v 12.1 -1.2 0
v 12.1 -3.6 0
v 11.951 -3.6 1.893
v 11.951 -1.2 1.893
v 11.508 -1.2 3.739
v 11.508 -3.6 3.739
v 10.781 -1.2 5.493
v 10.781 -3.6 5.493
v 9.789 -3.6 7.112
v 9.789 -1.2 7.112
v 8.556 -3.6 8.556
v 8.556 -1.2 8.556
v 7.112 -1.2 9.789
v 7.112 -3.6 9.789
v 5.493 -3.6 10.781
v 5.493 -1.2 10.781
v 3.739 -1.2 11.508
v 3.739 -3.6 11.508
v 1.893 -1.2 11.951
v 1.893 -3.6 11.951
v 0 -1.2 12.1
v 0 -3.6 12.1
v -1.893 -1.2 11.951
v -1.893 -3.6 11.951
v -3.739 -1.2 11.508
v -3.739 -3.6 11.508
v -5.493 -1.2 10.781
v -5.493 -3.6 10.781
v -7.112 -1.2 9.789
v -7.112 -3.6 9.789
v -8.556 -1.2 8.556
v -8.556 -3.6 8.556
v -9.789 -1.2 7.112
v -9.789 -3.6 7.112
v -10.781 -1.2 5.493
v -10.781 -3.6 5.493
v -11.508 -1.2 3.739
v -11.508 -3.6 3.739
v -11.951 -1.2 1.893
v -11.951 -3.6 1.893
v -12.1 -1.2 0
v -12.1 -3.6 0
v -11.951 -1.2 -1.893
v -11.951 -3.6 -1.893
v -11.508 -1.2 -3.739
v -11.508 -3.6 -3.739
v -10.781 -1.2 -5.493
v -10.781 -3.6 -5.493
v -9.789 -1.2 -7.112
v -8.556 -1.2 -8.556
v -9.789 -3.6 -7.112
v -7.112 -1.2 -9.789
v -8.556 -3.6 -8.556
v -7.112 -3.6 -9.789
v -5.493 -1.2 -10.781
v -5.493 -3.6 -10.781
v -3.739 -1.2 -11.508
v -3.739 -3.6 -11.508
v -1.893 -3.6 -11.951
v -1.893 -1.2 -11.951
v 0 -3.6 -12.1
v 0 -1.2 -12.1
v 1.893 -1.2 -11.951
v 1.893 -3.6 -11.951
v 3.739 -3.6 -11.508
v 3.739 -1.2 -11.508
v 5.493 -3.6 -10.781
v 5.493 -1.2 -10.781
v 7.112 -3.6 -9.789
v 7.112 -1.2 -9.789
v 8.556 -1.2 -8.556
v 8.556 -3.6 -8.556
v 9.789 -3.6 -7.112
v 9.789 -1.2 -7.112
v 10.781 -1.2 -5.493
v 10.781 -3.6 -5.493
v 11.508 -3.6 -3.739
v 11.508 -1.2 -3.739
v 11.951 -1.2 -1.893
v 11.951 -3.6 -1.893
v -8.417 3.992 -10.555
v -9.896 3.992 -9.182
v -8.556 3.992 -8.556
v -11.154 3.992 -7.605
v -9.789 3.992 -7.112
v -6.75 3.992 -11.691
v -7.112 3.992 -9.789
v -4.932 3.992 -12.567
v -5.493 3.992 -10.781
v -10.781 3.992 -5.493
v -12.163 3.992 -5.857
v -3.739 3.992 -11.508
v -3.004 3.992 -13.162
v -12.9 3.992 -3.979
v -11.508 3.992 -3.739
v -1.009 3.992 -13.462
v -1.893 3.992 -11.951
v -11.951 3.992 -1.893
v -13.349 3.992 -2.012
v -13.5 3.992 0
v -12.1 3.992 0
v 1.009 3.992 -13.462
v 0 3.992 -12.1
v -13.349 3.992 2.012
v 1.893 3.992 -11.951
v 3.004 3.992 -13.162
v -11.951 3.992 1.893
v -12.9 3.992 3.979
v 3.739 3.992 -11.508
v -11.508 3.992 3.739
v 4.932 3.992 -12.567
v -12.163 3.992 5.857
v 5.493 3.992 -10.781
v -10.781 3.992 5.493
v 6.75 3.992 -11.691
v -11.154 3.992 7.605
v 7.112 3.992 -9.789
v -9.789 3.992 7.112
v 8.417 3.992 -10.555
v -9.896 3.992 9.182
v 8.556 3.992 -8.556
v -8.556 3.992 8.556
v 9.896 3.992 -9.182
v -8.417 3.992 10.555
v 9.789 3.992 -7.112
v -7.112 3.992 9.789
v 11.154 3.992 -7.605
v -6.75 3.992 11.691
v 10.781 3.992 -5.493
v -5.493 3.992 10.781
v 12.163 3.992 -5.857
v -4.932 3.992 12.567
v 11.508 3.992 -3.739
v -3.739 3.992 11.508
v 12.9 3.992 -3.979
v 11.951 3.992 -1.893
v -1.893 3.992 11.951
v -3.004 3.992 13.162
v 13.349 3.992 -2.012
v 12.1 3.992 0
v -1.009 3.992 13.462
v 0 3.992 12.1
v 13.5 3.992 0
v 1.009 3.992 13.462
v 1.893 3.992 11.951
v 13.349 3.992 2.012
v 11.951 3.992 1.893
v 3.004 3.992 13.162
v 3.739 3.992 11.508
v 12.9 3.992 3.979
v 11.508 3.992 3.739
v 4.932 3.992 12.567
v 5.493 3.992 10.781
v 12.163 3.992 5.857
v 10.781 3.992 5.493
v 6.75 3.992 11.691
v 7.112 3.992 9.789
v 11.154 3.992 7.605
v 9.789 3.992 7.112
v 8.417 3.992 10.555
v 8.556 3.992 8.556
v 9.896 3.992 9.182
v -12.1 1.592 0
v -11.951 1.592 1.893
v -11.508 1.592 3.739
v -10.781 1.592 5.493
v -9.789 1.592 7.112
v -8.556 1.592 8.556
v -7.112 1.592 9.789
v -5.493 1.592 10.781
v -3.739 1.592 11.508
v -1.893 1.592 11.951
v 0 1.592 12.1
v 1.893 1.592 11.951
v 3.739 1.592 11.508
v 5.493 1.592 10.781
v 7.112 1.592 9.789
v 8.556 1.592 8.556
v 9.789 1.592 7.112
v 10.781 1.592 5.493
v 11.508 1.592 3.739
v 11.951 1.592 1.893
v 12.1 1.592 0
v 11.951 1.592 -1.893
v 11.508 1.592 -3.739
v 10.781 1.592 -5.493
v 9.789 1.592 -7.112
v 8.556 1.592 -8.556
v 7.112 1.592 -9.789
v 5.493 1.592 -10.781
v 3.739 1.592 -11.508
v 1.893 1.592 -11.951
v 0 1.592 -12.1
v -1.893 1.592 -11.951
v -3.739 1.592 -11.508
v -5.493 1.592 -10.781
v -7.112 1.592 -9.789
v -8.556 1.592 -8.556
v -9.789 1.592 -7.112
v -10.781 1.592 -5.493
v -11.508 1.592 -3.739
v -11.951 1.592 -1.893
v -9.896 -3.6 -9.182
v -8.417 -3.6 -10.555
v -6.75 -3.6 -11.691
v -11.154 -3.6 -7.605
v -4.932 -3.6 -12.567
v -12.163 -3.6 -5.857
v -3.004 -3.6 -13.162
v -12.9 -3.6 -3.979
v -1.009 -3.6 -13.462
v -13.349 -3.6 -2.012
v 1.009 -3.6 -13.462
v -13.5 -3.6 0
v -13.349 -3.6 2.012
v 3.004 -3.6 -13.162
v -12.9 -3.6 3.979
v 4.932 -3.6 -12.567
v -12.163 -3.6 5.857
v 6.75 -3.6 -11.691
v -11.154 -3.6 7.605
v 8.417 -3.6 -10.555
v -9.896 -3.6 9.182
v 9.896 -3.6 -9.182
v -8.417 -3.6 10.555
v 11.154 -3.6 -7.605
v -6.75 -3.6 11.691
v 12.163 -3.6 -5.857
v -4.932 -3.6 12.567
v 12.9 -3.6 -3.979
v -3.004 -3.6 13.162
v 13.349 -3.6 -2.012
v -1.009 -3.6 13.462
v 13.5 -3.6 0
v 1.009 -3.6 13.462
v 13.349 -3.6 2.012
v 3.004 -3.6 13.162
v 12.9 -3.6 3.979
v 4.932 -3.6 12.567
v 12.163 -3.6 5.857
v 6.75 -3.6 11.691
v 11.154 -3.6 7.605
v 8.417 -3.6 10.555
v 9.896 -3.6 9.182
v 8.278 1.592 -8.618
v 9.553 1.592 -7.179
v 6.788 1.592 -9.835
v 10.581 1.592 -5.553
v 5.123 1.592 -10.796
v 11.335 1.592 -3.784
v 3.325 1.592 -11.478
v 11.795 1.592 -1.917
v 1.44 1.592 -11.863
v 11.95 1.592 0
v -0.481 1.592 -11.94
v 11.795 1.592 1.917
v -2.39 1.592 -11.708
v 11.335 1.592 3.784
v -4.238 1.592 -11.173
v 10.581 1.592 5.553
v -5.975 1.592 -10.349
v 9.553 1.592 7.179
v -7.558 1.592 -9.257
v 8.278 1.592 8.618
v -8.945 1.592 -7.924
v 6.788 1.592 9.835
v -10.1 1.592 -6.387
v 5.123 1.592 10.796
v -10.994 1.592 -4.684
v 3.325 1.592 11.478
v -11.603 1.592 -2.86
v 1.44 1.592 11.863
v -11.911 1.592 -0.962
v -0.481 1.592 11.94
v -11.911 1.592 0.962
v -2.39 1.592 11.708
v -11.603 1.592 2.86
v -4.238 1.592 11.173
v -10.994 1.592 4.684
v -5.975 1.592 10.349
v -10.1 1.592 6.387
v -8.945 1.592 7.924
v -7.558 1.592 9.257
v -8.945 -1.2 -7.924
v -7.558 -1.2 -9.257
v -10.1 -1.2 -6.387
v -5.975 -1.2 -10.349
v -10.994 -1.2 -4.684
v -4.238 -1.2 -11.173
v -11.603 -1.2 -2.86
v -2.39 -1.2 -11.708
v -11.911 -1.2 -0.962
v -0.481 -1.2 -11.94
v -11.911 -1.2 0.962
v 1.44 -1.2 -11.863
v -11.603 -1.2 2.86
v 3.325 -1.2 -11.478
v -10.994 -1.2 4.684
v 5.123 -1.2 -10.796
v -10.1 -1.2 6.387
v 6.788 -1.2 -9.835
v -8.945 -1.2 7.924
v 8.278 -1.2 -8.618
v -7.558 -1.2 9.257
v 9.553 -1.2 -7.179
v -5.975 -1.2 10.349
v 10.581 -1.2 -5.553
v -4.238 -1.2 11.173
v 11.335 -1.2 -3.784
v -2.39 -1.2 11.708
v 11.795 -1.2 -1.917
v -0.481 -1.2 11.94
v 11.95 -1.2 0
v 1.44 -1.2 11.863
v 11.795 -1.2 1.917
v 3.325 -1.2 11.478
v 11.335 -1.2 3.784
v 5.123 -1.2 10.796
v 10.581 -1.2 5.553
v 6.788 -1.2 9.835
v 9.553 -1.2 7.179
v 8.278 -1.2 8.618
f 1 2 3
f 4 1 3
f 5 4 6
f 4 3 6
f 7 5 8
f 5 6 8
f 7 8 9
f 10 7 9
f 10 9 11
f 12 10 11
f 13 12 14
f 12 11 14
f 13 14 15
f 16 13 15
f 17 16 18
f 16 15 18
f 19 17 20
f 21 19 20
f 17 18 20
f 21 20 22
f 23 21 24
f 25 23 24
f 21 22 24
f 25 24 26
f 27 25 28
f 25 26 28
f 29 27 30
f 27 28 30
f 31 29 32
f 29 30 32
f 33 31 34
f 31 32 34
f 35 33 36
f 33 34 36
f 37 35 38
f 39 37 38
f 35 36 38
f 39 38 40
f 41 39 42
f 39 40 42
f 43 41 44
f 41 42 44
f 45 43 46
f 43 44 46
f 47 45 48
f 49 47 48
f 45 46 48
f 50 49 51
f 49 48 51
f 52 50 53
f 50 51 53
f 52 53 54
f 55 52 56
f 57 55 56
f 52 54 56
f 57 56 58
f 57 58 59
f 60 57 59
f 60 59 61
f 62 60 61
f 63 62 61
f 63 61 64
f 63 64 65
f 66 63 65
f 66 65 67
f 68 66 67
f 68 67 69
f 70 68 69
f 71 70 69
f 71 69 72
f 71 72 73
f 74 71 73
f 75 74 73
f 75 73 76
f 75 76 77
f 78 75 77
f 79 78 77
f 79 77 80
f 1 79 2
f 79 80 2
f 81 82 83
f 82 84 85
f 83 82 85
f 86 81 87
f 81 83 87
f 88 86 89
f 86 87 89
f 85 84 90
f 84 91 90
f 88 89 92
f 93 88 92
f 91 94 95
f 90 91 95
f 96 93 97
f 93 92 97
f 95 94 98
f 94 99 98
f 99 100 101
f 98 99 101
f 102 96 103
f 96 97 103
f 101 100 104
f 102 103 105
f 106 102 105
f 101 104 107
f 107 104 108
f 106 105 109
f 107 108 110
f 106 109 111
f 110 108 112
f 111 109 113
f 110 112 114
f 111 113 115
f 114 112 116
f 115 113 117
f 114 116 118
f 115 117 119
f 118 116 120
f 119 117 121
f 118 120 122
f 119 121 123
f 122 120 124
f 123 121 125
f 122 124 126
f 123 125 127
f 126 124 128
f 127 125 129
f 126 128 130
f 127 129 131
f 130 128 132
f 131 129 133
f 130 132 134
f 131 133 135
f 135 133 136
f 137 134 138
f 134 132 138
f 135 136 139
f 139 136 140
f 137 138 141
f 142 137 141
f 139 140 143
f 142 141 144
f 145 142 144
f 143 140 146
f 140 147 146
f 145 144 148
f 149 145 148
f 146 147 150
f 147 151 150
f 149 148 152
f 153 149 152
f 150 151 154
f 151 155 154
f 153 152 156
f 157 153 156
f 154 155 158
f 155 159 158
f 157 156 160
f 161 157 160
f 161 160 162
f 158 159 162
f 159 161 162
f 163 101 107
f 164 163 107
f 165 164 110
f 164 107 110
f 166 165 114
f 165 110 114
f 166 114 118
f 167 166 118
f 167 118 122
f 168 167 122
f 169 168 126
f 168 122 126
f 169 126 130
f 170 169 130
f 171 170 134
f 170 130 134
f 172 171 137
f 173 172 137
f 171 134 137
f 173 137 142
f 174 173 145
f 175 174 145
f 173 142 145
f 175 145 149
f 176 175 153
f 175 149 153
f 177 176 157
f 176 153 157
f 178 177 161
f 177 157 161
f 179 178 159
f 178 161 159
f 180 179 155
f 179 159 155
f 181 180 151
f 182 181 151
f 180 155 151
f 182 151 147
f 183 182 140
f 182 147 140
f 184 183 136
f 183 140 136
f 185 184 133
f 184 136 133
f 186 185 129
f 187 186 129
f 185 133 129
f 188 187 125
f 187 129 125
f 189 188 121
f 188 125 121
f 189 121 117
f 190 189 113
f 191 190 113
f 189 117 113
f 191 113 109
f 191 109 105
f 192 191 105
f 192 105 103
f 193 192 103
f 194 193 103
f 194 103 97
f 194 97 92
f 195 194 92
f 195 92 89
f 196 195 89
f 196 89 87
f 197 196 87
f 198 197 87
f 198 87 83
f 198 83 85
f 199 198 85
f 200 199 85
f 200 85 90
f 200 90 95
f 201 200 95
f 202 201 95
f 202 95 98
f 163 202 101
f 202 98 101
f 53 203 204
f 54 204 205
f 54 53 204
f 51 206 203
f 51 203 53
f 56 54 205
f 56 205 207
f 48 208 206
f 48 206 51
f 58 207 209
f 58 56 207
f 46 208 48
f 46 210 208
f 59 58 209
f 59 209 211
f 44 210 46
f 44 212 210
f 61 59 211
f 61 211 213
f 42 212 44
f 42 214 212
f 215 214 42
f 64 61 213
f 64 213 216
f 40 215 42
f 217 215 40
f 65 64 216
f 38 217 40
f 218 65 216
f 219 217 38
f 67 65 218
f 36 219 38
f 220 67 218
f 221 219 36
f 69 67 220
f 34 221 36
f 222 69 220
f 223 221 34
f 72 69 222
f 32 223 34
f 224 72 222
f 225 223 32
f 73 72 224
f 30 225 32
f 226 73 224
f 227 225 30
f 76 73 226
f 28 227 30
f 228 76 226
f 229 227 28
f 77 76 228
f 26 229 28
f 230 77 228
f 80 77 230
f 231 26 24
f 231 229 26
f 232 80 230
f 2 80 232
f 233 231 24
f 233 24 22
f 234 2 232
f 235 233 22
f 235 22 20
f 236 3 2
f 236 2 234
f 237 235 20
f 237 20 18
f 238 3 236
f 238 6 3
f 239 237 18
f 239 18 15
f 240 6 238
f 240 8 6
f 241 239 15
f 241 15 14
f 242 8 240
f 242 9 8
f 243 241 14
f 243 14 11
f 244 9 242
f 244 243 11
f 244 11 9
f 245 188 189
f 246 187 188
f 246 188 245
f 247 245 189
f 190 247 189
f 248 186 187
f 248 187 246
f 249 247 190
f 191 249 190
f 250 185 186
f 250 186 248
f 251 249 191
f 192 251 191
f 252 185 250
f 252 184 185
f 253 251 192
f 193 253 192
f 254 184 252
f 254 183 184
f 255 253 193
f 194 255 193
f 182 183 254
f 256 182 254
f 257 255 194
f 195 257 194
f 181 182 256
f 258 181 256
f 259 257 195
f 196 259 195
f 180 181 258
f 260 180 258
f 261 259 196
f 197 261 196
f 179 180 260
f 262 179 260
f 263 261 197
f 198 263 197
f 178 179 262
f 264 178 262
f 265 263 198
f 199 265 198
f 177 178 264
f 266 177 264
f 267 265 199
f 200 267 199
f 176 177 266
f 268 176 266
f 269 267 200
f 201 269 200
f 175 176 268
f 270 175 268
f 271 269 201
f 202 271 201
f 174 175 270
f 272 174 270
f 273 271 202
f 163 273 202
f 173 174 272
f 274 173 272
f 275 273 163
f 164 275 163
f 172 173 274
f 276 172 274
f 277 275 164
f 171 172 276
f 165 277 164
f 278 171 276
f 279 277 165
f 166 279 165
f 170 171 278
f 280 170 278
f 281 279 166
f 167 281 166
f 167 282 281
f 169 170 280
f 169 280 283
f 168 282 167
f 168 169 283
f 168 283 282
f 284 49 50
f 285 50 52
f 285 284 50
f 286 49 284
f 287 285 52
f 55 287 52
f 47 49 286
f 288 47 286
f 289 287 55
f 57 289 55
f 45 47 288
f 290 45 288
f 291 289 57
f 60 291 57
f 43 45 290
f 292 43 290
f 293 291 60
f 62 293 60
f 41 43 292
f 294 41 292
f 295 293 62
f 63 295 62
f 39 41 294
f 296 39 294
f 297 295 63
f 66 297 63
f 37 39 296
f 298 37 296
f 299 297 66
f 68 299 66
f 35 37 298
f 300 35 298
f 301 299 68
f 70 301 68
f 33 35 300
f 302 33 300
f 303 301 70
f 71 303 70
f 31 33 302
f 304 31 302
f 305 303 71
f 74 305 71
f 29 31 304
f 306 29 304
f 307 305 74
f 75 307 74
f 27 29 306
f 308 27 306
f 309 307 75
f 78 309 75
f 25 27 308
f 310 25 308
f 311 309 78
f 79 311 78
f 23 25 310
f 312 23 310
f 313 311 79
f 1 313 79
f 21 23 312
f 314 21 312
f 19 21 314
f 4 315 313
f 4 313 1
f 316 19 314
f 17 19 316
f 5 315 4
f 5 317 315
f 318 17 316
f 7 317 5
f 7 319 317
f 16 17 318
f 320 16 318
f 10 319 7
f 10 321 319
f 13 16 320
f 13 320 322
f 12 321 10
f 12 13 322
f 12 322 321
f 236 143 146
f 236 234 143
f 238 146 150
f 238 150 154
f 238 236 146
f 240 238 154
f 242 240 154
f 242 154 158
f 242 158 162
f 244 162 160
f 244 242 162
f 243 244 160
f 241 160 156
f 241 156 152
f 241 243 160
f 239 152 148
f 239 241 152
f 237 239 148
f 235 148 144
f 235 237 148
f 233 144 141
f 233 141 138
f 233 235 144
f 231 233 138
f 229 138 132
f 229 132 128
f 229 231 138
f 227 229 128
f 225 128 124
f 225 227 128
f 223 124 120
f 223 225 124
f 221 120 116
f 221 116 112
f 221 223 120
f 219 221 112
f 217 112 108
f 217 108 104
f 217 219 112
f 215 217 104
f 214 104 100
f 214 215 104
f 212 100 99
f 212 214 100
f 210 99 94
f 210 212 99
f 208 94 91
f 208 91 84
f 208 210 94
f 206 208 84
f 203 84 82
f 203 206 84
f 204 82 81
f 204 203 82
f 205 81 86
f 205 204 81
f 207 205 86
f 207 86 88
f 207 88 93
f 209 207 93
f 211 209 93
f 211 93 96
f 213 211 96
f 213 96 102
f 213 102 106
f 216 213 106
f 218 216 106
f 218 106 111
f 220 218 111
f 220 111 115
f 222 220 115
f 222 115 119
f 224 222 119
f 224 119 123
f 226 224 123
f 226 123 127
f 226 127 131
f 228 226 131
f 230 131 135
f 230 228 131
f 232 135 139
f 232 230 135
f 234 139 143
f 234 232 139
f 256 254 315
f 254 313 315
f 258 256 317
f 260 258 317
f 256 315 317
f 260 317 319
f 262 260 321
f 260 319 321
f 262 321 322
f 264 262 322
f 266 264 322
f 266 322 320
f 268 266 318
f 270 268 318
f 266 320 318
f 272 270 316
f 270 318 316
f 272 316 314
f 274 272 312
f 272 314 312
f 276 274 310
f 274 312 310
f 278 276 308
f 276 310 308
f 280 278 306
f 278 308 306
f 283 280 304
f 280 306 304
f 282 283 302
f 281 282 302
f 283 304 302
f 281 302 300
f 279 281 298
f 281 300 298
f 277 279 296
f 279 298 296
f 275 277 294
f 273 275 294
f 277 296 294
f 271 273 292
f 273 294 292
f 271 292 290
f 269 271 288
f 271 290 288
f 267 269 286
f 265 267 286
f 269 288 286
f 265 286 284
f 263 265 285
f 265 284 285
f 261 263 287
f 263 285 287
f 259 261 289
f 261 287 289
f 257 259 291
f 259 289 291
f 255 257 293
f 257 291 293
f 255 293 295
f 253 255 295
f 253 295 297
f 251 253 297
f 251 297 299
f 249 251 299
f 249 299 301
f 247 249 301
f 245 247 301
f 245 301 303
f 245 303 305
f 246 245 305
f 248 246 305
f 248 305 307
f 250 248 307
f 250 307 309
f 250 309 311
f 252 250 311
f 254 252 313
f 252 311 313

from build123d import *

# Parameters (mm, degrees)
F0_R          = 13.5
F0_R_2        = 11.95
F1_DEPTH      = 3.6
F1_DEPTH_BACK = 3.992162
F2_R          = 12.1
F2_R_2        = 11.95
F3_DEPTH      = 2.4
F4_R          = 12.1
F5_DEPTH      = 2.4


with BuildPart() as f1:
    # F0 (on Front) → F1 (new body, two sides)
    with BuildSketch(Plane.XZ) as f1_sk:
        Circle(F0_R)
        Circle(F0_R_2, mode=Mode.SUBTRACT)
    extrude(amount=F1_DEPTH)
    extrude(f1_sk.sketch, amount=-F1_DEPTH_BACK)

    # F2 (on face) → F3 (cut)
    with BuildSketch(Plane.XZ.offset(3.6)):
        Circle(F2_R)
        Circle(F2_R_2, mode=Mode.SUBTRACT)
    extrude(amount=-F3_DEPTH, mode=Mode.SUBTRACT)

    # F4 (on face) → F5 (cut)
    with BuildSketch(Plane(origin=(0, 3.992162, 0), x_dir=(-1, 0, 0), z_dir=(0, 1, 0))):
        Circle(F4_R)
    extrude(amount=-F5_DEPTH, mode=Mode.SUBTRACT)


solid = f1.part
